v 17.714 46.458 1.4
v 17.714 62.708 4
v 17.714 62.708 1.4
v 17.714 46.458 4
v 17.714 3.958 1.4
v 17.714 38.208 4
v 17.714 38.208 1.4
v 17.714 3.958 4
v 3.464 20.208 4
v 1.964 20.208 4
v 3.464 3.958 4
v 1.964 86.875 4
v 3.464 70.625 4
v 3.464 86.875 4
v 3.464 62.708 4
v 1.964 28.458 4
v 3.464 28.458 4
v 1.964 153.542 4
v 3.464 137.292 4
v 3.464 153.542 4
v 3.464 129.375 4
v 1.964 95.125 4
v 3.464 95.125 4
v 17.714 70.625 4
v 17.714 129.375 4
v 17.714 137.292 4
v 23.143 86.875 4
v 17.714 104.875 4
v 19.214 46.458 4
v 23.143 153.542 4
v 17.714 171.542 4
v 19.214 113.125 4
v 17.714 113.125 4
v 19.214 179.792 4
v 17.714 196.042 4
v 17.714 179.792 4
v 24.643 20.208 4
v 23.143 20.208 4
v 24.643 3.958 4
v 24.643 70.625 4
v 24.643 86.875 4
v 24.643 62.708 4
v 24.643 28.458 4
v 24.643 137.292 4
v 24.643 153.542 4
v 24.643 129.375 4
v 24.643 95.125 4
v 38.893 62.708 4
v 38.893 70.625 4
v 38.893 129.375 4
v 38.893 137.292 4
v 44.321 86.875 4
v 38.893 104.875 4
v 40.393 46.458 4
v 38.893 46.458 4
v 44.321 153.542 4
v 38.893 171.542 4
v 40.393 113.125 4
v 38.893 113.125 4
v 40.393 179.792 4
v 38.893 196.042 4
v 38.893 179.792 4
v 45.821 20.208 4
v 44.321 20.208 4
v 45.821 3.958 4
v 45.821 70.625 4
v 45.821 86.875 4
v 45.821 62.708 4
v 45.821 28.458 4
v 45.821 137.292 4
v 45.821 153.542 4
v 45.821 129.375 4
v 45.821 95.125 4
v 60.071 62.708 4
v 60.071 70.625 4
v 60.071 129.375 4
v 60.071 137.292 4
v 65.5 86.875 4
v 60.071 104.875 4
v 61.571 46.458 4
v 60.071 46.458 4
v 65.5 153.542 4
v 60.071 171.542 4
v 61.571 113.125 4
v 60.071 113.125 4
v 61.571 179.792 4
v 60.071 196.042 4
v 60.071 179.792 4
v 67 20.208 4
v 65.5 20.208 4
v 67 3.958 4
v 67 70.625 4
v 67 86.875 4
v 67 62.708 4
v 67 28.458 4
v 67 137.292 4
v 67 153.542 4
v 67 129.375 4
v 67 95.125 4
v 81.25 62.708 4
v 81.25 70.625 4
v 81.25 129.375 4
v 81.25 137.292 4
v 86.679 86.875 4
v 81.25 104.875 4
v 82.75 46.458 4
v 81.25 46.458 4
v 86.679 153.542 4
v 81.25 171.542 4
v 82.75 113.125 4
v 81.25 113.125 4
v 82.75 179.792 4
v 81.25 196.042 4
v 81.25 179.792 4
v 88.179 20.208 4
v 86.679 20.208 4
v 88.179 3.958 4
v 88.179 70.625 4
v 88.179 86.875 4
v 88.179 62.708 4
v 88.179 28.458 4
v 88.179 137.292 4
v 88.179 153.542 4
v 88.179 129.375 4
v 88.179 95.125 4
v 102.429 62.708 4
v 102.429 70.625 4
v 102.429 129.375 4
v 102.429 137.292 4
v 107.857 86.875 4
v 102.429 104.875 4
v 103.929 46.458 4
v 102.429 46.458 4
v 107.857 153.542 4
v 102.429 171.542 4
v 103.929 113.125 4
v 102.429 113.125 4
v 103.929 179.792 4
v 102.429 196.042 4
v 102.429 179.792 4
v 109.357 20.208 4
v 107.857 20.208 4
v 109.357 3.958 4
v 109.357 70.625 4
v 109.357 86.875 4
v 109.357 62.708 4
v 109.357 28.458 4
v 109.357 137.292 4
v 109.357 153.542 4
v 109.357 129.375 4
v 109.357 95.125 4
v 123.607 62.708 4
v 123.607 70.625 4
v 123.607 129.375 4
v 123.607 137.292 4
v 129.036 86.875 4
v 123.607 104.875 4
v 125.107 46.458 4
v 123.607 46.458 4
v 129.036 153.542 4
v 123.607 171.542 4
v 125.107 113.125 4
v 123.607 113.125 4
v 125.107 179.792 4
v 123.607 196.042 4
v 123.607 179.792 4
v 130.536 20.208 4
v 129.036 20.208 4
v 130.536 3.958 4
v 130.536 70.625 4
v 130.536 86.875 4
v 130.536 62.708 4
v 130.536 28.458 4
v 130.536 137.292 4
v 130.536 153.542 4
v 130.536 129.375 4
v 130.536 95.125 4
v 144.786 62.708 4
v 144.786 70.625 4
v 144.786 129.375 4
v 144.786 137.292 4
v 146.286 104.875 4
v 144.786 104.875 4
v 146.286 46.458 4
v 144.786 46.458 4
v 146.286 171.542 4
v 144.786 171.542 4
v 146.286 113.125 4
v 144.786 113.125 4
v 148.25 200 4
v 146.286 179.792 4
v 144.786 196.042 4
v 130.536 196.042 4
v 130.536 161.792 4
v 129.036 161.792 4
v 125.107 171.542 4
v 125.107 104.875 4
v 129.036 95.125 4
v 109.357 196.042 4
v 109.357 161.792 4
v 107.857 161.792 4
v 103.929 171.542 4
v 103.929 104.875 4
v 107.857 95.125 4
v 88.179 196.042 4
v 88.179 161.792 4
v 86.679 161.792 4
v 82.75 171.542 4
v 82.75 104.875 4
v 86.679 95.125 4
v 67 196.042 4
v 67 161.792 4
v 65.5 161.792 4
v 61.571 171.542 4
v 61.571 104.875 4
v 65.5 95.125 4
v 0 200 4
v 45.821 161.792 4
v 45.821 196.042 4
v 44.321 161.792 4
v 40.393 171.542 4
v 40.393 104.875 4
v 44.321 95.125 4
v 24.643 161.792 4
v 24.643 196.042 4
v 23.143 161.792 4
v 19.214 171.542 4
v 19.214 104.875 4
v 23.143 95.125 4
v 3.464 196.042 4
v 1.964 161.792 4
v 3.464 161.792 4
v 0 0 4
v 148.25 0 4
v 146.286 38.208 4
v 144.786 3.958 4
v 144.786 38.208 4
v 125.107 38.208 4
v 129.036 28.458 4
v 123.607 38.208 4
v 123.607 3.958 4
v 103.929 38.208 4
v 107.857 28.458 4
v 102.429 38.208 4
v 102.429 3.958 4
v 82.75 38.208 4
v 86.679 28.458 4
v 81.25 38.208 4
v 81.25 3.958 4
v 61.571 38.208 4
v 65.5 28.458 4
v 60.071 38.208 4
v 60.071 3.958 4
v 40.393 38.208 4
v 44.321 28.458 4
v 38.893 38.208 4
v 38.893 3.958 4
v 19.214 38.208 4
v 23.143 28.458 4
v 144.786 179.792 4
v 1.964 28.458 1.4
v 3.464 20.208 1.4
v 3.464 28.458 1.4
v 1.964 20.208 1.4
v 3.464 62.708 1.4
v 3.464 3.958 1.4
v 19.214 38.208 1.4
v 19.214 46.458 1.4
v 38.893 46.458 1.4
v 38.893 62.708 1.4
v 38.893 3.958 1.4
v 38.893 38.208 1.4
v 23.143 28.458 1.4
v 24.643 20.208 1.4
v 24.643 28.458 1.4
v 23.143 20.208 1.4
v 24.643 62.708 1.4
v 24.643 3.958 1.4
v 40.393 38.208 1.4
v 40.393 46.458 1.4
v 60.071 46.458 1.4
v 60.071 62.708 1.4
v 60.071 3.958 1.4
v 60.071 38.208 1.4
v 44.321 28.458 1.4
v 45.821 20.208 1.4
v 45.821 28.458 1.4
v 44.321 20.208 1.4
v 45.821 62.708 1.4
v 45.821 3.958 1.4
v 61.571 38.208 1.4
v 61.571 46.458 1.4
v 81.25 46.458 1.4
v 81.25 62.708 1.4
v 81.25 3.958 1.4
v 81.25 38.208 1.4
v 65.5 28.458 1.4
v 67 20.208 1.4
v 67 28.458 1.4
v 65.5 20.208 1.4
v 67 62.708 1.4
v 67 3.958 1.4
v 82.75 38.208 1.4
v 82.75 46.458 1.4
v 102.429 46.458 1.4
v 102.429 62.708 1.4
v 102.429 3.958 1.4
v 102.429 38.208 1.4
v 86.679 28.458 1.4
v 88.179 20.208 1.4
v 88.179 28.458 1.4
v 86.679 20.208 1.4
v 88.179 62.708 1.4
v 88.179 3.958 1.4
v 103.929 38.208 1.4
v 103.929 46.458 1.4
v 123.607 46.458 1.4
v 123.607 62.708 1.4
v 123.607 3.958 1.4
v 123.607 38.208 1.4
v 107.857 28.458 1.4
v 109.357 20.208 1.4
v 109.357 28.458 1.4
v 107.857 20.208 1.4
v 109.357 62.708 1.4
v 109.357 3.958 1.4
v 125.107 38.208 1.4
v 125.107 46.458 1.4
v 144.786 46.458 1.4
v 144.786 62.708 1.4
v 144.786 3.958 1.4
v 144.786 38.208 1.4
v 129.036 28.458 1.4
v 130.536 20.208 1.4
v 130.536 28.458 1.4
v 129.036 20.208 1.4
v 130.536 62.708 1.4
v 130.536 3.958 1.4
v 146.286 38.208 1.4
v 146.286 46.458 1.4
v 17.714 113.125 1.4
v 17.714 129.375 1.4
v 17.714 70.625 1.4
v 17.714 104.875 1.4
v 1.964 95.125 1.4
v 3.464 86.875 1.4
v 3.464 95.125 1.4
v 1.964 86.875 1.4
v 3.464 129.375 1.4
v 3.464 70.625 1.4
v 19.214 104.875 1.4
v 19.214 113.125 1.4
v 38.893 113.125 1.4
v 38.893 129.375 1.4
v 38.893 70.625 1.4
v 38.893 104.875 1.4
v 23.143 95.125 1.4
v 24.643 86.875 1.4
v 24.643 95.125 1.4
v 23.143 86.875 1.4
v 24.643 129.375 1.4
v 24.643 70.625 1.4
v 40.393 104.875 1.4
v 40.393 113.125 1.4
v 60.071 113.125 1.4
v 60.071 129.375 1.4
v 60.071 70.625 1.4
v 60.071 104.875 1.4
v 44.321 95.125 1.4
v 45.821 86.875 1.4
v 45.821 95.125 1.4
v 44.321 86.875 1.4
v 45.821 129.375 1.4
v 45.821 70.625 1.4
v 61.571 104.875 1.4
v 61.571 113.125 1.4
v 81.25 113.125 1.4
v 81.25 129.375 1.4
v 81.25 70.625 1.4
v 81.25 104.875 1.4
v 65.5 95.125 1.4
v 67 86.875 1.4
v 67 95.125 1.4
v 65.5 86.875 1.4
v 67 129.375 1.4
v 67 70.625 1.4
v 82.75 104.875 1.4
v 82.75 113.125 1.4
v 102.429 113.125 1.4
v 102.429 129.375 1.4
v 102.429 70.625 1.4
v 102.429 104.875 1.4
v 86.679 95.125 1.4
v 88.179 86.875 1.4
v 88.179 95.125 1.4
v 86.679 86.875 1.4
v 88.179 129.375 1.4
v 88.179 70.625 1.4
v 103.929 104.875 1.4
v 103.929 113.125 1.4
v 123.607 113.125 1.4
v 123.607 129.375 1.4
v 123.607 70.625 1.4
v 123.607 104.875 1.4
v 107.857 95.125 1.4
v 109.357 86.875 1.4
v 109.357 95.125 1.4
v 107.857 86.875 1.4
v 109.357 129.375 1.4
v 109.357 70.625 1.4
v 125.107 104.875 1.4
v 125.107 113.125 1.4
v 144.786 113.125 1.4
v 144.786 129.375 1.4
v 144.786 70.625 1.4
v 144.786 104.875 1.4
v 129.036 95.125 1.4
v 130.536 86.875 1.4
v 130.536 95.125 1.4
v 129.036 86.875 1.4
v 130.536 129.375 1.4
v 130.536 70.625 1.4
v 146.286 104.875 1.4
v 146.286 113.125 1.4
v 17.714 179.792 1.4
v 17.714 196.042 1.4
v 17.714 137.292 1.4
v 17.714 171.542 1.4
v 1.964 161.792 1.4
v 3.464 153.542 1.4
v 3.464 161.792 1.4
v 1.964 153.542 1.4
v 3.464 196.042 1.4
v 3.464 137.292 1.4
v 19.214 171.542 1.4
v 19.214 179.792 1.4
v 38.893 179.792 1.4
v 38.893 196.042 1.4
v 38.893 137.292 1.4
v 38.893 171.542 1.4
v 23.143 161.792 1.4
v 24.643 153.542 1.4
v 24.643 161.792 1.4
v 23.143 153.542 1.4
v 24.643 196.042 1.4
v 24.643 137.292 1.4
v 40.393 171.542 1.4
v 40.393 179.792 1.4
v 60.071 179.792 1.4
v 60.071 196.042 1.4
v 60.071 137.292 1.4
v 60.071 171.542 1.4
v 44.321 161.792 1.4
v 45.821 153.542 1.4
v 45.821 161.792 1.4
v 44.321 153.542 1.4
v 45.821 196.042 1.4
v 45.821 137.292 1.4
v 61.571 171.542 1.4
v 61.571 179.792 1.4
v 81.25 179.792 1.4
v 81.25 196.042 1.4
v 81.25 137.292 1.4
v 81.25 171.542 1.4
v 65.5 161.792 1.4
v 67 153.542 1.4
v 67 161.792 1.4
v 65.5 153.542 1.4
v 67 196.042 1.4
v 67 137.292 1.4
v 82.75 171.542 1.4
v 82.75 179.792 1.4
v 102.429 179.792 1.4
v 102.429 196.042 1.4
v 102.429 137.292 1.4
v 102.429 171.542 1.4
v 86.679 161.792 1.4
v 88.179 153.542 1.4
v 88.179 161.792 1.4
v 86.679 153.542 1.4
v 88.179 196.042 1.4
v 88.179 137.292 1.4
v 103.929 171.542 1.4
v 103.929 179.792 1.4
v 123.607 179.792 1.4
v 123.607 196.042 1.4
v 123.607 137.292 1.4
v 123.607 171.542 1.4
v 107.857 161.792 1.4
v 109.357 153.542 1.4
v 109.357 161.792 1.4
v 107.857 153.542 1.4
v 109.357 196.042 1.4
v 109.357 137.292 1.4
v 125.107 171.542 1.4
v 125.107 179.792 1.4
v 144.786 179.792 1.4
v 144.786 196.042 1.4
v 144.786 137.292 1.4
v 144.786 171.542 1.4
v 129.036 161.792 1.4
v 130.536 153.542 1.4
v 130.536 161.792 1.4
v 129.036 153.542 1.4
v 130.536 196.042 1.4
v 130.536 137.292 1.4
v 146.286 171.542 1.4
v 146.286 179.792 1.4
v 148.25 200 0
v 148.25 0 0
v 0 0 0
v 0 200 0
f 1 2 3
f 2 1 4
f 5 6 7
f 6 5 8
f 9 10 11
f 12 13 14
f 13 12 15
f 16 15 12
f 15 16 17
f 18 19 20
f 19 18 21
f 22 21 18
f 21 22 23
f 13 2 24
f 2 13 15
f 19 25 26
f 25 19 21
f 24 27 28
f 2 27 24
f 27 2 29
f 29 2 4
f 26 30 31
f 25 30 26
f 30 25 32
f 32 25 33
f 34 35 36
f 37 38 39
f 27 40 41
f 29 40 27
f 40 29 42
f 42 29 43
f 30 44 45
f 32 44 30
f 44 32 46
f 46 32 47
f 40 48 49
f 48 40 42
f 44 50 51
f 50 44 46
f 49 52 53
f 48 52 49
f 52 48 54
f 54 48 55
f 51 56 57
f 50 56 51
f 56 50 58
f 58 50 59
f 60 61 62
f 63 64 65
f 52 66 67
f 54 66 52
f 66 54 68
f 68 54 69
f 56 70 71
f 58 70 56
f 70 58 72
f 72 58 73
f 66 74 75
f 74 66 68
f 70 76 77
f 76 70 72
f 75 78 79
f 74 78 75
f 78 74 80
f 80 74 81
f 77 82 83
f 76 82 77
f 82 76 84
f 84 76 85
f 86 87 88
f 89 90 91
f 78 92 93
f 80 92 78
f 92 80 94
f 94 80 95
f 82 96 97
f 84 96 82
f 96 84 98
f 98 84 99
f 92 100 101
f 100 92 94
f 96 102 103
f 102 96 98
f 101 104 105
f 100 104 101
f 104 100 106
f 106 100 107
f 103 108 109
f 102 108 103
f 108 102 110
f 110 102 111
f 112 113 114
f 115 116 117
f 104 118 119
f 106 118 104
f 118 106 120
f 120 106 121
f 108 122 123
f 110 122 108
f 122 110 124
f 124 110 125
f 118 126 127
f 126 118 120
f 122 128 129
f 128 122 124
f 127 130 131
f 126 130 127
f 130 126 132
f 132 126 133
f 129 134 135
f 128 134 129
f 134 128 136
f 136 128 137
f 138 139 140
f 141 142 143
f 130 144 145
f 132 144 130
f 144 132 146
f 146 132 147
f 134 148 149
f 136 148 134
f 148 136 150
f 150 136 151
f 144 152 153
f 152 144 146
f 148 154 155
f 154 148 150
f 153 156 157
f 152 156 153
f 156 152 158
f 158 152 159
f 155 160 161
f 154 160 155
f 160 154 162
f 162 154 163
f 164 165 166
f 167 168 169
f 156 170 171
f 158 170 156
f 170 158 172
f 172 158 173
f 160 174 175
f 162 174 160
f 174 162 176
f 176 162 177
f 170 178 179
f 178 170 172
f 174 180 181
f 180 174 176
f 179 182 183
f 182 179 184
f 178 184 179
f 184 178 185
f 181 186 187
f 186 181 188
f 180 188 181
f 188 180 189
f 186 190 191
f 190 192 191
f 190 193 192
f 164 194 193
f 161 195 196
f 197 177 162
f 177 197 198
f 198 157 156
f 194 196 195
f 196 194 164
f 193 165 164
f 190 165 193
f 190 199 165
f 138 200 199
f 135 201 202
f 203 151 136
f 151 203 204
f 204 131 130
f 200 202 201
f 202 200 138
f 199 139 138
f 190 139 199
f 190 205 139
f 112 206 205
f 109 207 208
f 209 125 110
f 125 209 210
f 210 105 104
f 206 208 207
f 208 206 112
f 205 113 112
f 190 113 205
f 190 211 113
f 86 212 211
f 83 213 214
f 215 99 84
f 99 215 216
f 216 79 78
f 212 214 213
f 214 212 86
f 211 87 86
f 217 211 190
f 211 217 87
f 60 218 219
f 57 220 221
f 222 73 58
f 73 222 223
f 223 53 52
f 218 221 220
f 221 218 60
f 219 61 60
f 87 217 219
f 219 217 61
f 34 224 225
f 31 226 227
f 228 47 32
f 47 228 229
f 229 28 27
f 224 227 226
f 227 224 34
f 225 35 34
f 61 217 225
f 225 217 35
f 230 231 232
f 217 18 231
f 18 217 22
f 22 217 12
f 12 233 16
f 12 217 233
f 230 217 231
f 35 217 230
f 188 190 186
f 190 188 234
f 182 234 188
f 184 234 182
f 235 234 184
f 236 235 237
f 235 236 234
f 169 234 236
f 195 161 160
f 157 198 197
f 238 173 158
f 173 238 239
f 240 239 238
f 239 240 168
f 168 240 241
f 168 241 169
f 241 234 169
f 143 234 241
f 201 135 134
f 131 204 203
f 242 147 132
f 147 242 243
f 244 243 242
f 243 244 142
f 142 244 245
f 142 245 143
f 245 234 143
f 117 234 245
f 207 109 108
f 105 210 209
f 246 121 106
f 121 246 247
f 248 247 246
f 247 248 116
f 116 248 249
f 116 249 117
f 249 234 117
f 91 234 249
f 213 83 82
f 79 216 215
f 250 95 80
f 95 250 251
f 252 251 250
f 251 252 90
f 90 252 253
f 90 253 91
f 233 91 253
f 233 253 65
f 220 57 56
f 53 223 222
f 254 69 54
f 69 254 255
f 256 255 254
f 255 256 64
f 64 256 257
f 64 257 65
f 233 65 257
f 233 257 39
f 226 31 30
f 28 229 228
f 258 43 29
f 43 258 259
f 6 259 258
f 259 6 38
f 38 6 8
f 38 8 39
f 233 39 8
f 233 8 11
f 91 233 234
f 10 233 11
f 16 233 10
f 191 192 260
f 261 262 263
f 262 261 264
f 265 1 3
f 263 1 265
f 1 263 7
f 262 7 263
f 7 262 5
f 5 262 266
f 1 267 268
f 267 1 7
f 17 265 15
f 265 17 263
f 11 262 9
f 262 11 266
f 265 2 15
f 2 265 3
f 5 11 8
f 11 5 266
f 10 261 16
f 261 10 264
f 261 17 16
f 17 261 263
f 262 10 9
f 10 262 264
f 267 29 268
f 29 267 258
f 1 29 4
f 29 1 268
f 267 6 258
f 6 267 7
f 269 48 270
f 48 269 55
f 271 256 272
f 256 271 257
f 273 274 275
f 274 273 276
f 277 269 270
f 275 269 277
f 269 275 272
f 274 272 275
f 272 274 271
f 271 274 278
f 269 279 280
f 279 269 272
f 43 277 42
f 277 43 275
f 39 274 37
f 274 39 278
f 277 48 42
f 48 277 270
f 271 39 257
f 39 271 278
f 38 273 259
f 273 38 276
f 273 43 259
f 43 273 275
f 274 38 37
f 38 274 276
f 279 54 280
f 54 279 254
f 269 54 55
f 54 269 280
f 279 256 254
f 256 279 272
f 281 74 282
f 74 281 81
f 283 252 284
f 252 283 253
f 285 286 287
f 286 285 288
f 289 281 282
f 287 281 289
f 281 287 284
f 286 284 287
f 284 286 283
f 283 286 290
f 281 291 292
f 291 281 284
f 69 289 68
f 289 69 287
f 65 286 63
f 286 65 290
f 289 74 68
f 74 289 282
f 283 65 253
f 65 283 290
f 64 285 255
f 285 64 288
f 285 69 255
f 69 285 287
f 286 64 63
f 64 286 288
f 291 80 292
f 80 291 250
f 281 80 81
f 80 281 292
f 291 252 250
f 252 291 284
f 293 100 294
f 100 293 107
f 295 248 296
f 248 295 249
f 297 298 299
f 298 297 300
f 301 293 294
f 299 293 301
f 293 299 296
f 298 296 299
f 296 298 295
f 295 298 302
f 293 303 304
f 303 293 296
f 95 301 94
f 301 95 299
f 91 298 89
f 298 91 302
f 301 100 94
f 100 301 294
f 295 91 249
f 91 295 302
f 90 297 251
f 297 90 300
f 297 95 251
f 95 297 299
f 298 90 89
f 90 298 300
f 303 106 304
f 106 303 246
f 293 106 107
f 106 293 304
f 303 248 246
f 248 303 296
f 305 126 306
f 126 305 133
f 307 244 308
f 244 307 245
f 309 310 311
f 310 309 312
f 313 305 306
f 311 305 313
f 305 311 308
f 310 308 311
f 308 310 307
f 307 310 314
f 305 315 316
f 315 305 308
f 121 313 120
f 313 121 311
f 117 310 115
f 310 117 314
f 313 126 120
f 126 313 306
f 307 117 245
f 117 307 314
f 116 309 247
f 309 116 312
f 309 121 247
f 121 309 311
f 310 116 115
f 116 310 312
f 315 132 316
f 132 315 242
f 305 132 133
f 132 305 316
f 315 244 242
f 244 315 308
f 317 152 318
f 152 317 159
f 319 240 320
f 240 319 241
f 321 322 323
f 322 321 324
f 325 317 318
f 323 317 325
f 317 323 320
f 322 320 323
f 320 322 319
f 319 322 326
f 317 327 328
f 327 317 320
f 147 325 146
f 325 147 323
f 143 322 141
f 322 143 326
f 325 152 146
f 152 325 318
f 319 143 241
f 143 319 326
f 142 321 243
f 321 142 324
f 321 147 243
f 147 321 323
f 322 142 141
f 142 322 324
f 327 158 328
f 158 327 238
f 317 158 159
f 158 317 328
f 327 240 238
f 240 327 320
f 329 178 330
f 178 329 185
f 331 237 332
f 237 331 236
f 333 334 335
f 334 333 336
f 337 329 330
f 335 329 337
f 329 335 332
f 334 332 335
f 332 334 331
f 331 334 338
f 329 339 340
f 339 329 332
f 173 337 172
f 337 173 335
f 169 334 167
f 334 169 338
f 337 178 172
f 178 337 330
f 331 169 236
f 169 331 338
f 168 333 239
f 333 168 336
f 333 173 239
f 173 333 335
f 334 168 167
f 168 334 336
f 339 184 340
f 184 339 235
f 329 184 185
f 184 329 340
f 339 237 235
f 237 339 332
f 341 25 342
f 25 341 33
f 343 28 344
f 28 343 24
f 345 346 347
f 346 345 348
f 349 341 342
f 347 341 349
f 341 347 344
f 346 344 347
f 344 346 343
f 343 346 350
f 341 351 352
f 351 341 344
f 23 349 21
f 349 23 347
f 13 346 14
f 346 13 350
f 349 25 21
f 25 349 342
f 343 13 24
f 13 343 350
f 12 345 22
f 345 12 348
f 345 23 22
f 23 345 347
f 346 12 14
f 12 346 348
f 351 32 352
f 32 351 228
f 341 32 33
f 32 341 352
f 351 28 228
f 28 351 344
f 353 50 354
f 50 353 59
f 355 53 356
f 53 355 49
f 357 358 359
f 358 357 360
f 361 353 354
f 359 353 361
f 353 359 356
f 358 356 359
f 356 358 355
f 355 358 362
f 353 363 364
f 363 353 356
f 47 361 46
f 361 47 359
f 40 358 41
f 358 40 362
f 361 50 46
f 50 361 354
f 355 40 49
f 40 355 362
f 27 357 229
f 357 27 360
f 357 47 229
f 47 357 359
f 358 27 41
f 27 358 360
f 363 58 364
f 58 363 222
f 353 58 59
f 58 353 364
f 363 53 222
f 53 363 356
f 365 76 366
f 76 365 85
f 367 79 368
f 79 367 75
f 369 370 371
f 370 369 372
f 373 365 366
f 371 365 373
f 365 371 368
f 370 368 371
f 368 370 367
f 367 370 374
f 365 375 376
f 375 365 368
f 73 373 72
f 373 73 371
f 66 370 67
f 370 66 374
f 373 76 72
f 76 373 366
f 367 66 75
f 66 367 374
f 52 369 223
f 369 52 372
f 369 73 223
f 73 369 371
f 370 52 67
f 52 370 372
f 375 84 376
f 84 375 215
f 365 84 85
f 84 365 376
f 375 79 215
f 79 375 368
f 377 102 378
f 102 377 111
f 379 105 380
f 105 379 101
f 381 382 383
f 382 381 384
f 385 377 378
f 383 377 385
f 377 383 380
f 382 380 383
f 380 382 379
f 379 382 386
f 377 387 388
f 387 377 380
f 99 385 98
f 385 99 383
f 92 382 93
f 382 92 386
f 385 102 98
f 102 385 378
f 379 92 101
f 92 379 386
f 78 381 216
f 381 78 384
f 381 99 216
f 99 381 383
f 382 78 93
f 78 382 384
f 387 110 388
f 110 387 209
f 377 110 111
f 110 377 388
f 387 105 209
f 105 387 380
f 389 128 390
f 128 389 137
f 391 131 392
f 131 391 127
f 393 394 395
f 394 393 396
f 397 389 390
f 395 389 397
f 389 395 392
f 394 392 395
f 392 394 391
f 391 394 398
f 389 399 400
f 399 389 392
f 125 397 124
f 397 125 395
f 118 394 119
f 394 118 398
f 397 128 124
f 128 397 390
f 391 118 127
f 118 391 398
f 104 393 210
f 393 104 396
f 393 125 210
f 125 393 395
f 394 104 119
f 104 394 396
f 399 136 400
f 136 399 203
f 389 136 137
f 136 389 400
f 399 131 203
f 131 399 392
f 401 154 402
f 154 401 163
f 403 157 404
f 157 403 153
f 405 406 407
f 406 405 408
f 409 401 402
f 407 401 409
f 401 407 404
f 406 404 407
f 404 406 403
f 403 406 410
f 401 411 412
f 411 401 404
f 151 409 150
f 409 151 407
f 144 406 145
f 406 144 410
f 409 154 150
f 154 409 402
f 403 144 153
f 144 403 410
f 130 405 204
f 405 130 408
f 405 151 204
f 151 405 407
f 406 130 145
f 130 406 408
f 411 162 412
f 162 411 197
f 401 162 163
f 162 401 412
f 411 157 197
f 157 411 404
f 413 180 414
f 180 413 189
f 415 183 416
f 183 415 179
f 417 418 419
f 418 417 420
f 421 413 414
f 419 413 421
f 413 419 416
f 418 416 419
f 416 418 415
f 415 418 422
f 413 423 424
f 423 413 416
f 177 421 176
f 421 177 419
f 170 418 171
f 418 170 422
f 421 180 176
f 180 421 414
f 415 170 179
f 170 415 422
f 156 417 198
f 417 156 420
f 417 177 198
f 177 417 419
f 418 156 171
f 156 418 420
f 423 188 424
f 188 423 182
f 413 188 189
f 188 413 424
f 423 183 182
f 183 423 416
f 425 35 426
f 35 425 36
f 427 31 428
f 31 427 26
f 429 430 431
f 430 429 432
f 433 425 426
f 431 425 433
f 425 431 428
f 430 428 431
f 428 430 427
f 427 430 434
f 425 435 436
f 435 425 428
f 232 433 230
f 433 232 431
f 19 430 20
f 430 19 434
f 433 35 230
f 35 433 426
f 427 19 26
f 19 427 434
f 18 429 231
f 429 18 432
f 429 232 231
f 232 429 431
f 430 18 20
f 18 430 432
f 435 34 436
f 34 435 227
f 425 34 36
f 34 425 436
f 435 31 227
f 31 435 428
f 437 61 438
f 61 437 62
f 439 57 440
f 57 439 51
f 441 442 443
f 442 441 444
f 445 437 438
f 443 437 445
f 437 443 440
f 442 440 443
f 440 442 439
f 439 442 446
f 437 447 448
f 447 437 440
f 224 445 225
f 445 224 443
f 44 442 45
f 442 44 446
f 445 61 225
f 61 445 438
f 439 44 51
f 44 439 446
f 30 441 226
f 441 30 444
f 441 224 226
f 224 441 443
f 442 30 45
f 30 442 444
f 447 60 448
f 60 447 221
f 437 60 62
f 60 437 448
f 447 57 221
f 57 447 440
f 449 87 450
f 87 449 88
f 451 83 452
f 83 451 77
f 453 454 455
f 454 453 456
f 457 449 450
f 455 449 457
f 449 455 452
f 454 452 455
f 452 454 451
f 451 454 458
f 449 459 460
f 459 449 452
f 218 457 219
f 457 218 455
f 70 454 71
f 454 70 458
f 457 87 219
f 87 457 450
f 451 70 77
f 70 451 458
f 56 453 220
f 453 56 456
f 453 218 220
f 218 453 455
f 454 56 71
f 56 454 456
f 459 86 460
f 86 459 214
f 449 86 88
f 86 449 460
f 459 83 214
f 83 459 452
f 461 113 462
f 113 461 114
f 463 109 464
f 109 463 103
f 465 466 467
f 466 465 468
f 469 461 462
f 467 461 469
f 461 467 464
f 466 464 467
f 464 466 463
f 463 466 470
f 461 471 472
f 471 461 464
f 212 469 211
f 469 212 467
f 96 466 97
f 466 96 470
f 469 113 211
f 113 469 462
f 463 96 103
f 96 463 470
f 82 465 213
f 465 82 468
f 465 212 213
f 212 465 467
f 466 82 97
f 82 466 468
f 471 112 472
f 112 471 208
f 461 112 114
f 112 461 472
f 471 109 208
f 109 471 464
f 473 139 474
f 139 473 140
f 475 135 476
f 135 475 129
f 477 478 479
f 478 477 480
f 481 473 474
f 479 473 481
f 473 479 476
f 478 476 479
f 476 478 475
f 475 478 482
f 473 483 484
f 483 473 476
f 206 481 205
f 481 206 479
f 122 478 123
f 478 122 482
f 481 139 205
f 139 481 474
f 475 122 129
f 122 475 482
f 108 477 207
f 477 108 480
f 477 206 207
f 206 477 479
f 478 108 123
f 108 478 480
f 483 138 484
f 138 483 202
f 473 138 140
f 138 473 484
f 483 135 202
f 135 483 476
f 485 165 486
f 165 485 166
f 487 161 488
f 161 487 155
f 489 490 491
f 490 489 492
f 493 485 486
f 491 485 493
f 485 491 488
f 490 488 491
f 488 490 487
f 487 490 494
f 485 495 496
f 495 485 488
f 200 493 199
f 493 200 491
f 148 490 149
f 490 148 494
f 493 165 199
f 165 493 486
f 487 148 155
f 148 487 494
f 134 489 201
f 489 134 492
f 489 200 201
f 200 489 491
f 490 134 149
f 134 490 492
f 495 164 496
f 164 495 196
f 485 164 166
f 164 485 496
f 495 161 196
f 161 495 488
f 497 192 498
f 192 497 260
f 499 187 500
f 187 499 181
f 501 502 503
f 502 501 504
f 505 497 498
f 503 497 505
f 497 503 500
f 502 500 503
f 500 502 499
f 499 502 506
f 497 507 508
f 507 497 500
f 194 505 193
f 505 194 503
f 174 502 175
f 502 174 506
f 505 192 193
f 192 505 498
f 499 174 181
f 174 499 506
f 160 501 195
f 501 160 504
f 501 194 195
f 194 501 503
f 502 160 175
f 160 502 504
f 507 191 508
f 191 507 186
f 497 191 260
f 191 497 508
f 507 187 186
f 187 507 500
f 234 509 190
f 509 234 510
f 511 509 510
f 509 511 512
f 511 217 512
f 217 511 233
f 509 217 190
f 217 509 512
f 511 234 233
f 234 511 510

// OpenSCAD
item_width = 14.25;
item_length = 58.75;
item_depth = 2.6;

jig_width = 148.25;
jig_length = 200;
jig_depth = 4;

mold_area_width = jig_width / 7;
mold_area_length = jig_length / 3;

protrusion_length = 8.25;
protrusion_width = 1.5;
protrusion_offset = 16.25;

difference() {
    // Jig
    cube([
        jig_width,
        jig_length,
        jig_depth
    ]);

    // Items
    for (j = [0:2]) {
        for (i = [0:6]) {
            translate([
                mold_area_width * i + 1/2 * (mold_area_width - item_width),
                mold_area_length * j + 1/2 * (mold_area_length - item_length),
                jig_depth - item_depth
            ]) {
                cube([
                    item_width,
                    item_length,
                    item_depth
                ]);
            }

            // Pen Tabs
            translate([
                mold_area_width * i + 1/2 * (mold_area_width - item_width) - protrusion_width,
                mold_area_length * j + 1/2 * (mold_area_length - item_length) + protrusion_offset,
                jig_depth - item_depth
            ]) {
                cube([
                    protrusion_width,
                    protrusion_length,
                    item_depth
                ]);
            }

            translate([
                mold_area_width * i + 1/2 * (mold_area_width - item_width) + item_width,
                mold_area_length * j + 1/2 * (mold_area_length - item_length) + item_length - protrusion_offset - protrusion_length,
                jig_depth - item_depth
            ]) {
                cube([
                    protrusion_width,
                    protrusion_length,
                    item_depth
                ]);
            }
        }
    }
}
